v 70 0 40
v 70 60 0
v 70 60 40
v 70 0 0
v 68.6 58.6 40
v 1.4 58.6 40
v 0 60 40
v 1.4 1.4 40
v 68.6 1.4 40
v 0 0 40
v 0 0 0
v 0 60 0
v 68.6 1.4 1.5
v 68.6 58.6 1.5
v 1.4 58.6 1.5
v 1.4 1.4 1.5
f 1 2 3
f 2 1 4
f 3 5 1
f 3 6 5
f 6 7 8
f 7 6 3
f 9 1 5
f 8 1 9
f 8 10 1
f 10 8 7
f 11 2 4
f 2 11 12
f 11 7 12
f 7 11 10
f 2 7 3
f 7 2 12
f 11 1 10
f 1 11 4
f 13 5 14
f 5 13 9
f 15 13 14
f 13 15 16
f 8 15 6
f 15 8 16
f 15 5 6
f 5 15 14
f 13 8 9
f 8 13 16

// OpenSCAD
$fn = 32;
// target_bbox: 70, 60, 40
// ----------------------------------------------------------------------
// Open box: 1.4 mm walls
// ----------------------------------------------------------------------

// --- parameters (mm) ---
box_l = 70;               // outer length, X
box_w = 60;               // outer width, Y
box_h = 40;               // outer height, Z
wall = 1.4;               // wall thickness
floor = 1.5;              // floor thickness

difference() {
  cube([box_l, box_w, box_h]);
  translate([wall, wall, floor])
    cube([box_l - 2 * wall, box_w - 2 * wall, box_h]);
}
